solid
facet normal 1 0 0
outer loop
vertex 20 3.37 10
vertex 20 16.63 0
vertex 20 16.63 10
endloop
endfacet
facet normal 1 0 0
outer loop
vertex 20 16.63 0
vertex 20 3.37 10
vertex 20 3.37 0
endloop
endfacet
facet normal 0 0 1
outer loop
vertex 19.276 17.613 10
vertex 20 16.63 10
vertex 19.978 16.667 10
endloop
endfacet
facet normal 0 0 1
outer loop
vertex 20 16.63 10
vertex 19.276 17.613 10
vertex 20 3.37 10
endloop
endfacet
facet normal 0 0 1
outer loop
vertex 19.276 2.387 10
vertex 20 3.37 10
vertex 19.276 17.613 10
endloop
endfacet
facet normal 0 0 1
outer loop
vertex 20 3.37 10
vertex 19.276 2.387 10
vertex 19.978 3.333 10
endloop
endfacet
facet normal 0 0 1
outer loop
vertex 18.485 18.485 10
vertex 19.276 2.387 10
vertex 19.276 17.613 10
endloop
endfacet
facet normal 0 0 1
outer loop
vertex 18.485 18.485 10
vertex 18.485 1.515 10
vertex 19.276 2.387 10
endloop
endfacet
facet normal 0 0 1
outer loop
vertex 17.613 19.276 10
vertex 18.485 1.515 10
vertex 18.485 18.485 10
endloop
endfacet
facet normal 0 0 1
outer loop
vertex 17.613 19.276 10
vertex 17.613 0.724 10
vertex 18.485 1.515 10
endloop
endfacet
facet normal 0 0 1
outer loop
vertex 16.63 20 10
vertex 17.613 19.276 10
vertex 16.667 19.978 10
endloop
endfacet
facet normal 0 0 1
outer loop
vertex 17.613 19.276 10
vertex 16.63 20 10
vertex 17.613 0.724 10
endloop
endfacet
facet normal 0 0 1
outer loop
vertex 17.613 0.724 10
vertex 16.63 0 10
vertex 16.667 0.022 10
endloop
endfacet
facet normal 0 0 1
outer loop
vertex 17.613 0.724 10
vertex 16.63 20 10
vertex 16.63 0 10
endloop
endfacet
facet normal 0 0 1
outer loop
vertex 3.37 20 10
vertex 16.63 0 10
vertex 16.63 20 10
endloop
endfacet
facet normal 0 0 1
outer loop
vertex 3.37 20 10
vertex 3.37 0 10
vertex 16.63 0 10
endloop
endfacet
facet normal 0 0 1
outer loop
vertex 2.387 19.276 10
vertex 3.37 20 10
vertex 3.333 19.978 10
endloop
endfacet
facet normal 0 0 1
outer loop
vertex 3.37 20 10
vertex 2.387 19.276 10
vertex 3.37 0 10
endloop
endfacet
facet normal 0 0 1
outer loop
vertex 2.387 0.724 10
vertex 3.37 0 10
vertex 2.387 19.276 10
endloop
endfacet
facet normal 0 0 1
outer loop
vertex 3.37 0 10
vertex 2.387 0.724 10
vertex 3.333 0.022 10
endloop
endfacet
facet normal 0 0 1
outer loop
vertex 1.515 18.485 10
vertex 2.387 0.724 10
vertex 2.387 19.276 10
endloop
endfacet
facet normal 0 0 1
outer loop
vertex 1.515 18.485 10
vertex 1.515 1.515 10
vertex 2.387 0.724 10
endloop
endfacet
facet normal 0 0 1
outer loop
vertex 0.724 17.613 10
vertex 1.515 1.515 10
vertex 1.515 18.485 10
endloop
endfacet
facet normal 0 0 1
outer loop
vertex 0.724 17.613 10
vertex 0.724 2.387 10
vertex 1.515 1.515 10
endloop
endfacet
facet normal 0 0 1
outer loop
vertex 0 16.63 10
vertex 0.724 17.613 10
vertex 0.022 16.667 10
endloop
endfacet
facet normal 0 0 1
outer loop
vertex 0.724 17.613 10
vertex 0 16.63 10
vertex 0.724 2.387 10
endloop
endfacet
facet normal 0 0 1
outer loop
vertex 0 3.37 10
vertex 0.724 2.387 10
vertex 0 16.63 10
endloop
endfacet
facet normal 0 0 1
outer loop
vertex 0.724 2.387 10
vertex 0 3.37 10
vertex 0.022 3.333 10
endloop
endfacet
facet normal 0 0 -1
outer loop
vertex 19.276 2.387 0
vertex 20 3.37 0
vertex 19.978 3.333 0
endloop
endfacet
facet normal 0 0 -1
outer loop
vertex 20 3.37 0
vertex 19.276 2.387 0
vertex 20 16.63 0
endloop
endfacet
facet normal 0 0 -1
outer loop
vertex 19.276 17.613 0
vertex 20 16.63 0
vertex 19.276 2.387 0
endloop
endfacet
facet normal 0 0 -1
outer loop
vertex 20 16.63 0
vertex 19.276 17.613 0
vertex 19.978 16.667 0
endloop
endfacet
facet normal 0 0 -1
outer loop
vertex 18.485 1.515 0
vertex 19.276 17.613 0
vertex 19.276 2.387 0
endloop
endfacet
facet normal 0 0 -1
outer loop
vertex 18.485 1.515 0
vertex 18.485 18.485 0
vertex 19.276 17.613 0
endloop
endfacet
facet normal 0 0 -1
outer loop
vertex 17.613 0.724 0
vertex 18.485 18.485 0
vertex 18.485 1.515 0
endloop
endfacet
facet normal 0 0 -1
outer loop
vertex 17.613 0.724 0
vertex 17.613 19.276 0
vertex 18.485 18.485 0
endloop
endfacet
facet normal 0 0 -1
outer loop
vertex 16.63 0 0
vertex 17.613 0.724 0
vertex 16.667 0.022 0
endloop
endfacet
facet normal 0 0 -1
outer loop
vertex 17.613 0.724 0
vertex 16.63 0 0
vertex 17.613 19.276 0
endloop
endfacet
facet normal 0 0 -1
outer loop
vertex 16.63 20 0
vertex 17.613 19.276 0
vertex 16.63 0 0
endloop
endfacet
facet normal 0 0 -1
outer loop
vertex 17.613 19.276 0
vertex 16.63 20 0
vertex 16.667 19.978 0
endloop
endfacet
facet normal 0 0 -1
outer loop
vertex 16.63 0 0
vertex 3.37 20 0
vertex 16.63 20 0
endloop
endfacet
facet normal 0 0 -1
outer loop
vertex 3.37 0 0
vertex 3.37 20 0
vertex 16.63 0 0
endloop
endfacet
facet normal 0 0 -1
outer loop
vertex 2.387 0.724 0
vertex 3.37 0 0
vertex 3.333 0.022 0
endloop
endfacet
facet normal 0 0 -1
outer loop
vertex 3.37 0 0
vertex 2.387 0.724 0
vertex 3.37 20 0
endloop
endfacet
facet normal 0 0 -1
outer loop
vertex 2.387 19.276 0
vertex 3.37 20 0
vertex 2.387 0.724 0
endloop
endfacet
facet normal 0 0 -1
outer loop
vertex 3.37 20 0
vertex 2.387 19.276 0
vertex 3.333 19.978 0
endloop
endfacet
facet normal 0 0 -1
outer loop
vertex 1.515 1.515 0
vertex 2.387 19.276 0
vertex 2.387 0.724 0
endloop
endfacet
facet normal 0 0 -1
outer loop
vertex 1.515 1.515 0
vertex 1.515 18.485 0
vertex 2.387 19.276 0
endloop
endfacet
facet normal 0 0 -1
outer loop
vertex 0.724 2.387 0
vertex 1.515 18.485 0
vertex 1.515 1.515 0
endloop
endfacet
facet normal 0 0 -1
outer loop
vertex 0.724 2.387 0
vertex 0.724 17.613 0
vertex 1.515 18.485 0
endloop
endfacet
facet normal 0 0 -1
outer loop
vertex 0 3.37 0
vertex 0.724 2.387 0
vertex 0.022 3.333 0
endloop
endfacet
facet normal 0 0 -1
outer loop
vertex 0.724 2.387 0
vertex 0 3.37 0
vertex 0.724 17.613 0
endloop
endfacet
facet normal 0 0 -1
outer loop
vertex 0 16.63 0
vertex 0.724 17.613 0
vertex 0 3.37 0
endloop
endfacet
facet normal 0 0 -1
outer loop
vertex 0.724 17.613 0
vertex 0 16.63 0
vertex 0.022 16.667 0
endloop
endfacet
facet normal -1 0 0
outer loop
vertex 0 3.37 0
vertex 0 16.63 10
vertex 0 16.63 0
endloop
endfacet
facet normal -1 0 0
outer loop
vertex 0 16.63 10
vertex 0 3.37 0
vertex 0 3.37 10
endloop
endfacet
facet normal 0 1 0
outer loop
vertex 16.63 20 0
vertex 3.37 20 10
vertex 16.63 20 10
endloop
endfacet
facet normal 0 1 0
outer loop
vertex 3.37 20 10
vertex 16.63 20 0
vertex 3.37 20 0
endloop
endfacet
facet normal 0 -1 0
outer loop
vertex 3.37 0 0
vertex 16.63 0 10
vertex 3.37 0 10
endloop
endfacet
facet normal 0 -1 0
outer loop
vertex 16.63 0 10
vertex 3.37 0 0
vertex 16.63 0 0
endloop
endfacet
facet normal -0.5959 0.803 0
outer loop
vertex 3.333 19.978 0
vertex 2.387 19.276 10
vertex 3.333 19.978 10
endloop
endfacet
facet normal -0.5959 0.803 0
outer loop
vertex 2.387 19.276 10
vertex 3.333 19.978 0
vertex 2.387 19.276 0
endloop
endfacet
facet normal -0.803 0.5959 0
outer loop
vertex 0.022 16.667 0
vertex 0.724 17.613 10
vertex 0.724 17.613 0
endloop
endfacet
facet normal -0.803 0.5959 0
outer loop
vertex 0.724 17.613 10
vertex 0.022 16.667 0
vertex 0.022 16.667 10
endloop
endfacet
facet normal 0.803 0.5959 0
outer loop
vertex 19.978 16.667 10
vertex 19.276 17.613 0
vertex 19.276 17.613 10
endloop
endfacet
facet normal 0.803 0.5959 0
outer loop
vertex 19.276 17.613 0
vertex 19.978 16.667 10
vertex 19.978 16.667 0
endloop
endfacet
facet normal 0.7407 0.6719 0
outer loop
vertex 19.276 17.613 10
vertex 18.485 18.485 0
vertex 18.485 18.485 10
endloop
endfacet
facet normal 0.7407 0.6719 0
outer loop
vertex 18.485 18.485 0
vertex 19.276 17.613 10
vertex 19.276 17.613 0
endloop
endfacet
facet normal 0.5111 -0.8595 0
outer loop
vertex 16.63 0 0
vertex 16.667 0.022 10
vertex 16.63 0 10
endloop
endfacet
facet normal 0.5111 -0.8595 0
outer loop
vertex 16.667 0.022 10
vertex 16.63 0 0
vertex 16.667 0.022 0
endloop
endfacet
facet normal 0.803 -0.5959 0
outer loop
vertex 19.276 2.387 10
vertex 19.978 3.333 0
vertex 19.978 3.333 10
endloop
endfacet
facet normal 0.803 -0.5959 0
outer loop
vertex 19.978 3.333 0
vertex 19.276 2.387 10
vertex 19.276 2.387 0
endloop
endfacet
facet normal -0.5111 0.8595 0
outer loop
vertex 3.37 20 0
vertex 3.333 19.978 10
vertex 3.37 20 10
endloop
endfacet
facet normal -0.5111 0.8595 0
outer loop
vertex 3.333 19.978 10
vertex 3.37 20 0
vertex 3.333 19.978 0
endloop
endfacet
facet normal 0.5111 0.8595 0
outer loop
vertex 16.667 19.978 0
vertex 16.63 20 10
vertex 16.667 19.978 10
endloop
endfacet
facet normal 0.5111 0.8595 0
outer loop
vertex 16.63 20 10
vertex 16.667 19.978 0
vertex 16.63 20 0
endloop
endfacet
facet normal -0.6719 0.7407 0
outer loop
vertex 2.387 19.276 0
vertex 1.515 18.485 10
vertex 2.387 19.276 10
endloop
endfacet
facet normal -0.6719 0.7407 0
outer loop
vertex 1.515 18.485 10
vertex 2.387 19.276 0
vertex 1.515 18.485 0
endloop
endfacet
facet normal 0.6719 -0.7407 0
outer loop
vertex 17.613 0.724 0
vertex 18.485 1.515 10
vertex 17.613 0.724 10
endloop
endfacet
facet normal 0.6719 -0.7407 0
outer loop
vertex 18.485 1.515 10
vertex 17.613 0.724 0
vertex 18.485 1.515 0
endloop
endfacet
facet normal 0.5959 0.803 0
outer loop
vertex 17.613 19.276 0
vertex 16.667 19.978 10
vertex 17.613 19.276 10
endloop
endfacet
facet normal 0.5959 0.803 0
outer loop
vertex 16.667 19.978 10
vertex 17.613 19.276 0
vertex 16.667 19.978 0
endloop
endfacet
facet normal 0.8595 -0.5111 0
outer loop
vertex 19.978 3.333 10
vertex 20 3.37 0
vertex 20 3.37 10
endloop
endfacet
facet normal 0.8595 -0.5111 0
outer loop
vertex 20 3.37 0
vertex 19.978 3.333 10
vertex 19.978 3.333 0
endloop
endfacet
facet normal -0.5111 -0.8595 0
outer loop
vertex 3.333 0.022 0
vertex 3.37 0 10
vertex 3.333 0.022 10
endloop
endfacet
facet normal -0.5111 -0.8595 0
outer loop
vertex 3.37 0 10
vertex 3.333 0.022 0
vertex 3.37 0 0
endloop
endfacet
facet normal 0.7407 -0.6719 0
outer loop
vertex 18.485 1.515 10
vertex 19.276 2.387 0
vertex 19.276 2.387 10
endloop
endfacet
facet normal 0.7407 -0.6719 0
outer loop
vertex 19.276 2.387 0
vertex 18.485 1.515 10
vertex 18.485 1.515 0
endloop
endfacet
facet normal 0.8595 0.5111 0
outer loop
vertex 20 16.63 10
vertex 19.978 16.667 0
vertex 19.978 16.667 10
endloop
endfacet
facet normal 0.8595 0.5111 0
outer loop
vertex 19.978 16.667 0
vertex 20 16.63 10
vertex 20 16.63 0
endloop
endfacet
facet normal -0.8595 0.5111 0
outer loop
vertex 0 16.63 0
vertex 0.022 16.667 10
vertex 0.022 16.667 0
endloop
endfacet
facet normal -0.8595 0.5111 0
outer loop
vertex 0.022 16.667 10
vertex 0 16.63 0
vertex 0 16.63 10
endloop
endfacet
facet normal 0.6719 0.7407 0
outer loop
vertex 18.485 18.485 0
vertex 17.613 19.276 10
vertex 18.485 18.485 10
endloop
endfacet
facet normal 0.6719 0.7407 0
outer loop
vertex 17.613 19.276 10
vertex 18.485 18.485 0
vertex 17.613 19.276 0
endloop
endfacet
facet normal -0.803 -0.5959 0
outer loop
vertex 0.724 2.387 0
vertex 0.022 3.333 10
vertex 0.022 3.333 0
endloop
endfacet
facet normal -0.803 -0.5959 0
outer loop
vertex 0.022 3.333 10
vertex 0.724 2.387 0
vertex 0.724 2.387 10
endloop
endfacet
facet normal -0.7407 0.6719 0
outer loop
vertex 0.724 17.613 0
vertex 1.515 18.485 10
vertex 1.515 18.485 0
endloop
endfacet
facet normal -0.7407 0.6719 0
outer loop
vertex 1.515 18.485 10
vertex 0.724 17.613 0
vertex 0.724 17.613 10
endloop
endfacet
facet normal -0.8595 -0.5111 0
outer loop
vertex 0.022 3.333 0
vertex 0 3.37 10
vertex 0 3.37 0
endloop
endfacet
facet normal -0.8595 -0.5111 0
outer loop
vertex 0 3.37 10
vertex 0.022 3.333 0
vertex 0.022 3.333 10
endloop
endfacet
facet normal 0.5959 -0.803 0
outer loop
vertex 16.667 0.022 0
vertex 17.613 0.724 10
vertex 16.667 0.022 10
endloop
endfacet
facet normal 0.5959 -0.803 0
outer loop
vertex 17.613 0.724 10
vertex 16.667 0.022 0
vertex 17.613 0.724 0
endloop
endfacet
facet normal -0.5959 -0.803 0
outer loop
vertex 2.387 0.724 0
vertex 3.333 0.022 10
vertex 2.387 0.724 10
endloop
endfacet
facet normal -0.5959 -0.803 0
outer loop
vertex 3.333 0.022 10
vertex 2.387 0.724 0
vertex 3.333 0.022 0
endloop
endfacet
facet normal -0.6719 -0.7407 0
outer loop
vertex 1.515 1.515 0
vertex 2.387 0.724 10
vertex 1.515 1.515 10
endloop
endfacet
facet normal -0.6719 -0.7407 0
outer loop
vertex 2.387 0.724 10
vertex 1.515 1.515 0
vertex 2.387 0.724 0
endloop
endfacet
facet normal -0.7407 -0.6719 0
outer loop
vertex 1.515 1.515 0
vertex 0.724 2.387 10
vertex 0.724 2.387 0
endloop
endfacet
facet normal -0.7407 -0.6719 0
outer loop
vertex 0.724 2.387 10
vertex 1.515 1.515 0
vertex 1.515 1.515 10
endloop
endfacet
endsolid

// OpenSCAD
// Original CanvasNet test fixture: a square block trimmed by a round cutter.
// The block covers x 0..20, y 0..20, z 0..10; the cylinder is centered at (10, 10) with radius 12, so it removes
// the four corners of the block (their distance from the center is about 14.1) but not the middle of the sides.
intersection() {
  cube([20, 20, 10]);
  translate([10, 10, -1]) cylinder(r = 12, h = 12, $fn = 64);
}
